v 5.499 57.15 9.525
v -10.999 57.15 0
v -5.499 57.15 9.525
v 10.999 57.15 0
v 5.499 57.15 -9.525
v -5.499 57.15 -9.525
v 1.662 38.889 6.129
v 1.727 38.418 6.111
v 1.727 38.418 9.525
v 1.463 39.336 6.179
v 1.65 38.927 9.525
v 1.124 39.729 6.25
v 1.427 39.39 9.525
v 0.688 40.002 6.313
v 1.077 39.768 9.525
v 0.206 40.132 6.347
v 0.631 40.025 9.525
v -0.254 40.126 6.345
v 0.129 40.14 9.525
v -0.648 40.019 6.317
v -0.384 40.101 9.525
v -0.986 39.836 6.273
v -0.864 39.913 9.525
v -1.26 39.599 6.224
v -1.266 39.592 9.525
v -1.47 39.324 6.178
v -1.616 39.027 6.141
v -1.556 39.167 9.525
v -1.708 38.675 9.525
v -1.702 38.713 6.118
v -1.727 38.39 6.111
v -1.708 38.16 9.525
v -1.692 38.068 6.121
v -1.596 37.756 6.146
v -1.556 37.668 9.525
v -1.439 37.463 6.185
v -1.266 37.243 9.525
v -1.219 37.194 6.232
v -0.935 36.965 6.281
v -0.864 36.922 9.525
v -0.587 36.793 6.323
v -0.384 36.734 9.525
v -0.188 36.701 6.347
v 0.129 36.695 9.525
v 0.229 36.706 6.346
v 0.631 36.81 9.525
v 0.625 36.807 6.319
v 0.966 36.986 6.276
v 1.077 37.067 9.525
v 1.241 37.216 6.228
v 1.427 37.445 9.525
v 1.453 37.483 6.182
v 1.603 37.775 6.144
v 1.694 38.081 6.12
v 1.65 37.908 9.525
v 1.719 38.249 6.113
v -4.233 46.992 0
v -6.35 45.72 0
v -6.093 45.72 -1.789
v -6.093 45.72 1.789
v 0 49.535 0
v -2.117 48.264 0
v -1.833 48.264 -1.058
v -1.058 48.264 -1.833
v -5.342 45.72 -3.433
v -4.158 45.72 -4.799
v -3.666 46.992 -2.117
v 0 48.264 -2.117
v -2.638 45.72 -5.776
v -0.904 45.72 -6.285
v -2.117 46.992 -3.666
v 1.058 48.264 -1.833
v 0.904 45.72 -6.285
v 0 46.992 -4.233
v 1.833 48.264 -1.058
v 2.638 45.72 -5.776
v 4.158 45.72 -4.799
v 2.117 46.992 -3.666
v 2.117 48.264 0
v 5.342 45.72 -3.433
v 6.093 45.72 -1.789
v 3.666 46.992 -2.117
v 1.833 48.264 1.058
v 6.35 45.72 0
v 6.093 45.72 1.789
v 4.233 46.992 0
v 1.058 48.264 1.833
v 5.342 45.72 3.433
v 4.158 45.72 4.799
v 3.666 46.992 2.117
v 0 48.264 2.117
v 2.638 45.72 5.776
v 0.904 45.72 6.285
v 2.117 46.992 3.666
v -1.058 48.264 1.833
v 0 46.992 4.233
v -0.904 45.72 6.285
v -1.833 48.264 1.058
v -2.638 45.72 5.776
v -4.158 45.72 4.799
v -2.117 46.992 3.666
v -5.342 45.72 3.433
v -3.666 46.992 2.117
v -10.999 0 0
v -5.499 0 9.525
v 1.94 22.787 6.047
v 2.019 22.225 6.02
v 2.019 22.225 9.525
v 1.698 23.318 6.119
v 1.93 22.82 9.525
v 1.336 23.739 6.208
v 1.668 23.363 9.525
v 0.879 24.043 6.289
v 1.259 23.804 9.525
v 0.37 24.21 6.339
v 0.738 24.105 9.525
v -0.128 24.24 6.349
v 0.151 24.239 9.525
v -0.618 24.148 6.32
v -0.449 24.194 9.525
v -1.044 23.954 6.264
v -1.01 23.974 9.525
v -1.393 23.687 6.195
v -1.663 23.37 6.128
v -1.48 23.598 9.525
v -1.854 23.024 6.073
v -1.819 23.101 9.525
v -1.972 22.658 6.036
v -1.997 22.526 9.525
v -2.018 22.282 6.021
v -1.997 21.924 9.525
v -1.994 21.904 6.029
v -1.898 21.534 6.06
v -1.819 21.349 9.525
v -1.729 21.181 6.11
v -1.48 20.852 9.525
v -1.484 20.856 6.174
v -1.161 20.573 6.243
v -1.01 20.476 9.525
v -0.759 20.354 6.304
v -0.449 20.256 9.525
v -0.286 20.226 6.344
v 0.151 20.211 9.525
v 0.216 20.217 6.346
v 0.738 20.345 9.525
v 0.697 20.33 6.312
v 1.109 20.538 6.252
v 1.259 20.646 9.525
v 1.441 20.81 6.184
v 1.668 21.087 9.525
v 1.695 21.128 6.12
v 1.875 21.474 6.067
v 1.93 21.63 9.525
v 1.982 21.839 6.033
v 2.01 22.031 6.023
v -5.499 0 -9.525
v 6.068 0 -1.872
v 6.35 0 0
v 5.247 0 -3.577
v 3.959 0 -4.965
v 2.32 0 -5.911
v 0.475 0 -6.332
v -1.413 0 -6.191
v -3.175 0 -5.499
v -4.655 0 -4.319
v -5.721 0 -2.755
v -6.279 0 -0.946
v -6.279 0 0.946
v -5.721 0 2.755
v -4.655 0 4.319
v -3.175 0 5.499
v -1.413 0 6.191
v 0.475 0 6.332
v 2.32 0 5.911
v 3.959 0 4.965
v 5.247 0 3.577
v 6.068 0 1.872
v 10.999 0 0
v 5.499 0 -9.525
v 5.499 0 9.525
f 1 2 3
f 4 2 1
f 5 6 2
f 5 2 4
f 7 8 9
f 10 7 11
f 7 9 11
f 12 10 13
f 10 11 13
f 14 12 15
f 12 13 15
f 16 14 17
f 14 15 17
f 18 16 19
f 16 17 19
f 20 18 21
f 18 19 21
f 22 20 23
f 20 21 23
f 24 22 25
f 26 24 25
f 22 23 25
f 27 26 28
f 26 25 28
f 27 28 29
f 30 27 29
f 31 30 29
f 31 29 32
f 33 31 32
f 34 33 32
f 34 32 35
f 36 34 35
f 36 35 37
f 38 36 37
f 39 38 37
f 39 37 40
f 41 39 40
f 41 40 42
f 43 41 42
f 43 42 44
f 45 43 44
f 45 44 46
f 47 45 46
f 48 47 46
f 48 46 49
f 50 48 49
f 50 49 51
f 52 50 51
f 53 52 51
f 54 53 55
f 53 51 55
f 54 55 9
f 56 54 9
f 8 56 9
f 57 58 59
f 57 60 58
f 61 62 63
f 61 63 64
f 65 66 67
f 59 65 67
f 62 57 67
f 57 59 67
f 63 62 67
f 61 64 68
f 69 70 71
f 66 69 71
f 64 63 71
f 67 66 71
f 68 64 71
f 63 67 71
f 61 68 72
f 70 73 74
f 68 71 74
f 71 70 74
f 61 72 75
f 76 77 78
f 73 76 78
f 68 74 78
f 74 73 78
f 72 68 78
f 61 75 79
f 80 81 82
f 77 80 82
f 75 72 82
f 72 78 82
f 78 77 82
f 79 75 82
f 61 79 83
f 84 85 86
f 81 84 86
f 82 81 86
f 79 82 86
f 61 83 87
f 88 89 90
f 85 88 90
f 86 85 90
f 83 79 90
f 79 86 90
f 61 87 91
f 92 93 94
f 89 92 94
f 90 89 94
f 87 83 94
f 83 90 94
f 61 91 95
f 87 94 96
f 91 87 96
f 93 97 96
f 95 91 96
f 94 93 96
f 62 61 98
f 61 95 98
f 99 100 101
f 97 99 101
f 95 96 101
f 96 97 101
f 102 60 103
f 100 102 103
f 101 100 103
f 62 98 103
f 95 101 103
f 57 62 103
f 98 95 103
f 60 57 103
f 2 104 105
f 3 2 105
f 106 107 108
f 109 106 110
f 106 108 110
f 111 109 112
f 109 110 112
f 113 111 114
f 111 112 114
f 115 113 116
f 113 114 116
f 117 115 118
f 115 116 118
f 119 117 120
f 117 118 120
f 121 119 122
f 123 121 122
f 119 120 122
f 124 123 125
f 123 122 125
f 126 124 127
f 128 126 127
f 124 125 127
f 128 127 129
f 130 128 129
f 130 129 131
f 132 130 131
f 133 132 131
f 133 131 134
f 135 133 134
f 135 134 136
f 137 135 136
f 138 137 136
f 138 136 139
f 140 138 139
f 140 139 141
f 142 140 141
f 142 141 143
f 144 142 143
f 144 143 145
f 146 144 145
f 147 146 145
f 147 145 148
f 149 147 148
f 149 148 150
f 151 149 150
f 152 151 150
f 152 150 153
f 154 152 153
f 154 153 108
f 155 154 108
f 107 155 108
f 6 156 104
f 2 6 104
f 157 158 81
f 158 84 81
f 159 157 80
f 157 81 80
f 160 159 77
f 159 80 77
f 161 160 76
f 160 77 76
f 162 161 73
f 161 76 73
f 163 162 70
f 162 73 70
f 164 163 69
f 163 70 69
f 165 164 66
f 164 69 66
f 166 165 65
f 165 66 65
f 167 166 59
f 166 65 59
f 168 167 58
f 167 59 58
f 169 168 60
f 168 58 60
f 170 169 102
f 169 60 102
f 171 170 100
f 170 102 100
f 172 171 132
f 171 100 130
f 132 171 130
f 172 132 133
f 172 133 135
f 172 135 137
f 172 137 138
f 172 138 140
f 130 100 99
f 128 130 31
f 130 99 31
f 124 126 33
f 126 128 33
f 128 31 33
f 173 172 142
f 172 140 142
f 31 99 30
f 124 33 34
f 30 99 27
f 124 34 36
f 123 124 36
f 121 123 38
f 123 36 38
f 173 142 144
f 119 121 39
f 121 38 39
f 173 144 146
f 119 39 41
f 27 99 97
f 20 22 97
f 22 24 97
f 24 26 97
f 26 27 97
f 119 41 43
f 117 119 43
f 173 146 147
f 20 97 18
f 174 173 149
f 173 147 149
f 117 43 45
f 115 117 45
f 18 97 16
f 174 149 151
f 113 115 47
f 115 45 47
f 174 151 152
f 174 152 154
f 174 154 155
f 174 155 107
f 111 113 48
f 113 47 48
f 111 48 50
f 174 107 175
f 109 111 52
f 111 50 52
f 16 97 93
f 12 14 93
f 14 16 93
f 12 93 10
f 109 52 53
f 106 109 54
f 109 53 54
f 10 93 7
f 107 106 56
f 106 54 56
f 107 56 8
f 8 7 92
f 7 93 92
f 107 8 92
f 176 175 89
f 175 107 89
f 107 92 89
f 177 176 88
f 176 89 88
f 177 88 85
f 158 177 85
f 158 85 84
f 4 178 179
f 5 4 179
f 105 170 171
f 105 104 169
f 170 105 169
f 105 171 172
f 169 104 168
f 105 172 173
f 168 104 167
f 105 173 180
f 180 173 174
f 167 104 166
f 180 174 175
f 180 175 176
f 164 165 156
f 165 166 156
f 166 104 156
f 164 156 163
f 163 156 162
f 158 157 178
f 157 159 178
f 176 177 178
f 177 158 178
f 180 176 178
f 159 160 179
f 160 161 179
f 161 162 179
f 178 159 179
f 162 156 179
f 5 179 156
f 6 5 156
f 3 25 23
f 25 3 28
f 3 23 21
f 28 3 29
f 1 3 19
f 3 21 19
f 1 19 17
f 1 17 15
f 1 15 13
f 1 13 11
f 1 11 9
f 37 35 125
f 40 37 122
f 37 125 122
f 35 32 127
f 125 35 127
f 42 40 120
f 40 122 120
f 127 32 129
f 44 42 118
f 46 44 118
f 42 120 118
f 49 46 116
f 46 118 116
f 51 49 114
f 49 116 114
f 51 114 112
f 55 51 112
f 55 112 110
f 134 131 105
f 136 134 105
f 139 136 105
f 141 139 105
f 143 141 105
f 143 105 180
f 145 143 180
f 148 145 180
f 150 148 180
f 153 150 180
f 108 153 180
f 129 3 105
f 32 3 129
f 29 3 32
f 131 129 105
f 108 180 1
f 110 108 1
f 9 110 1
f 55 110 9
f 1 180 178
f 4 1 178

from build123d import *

# Parameters (mm, degrees)
BOSS_EXTRUDE1_DEPTH              = 57.15
F_1_2_0_5_DIAMETER_HOLE1_D       = 12.7
F_1_2_0_5_DIAMETER_HOLE1_DEPTH   = 45.72
F_1_2_0_5_DIAMETER_HOLE1_TIP     = 3.815464931
F_10_32_TAPPED_HOLE1_REACH       = 63.237
F_10_32_TAPPED_HOLE1_BORE_R      = 2.0193
F_29_0_136_DIAMETER_HOLE1_REACH  = 63.237
F_29_0_136_DIAMETER_HOLE1_BORE_R = 1.7272


with BuildPart() as part:
    # Sketch1 → Boss-Extrude1 (new body)
    with BuildSketch(Plane(origin=(0, 0, 0), x_dir=(1, 0, 0), z_dir=(0, 1, 0))):
        Polygon((5.499261314, -9.525), (10.998522628, 0), (5.499261314, 9.525), (-5.499261314, 9.525), (-10.998522628, 0), (-5.499261314, -9.525), align=None)
    extrude(amount=BOSS_EXTRUDE1_DEPTH)

    # 1/2 (0.5) Diameter Hole1
    with Locations(Plane(origin=(0, 0, 0), x_dir=(-1, 0, 0), z_dir=(0, -1, 0))):
        with Locations((0, 0)):
            Hole(F_1_2_0_5_DIAMETER_HOLE1_D / 2, depth=F_1_2_0_5_DIAMETER_HOLE1_DEPTH)
            with Locations((0, 0, -(F_1_2_0_5_DIAMETER_HOLE1_DEPTH + F_1_2_0_5_DIAMETER_HOLE1_TIP / 2))):  # 118° drill point
                Cone(0, F_1_2_0_5_DIAMETER_HOLE1_D / 2, F_1_2_0_5_DIAMETER_HOLE1_TIP, mode=Mode.SUBTRACT)

    # #10-32 Tapped Hole1 bore → #10-32 Tapped Hole1 (cut, up to next)
    with BuildSketch(Plane.XY.offset(9.525), mode=Mode.PRIVATE) as f_10_32_tapped_hole1_sk1:
        with Locations((0, 22.225)):
            Circle(F_10_32_TAPPED_HOLE1_BORE_R)
    f_10_32_tapped_hole1_tool1 = extrude(f_10_32_tapped_hole1_sk1.sketch, amount=-F_10_32_TAPPED_HOLE1_REACH, mode=Mode.PRIVATE) & part.part
    add(f_10_32_tapped_hole1_tool1.solids().sort_by_distance((0, 22.225, 9.525))[0], mode=Mode.SUBTRACT)

    # #29 (0.136) Diameter Hole1 bore → #29 (0.136) Diameter Hole1 (cut, up to next)
    with BuildSketch(Plane.XY.offset(9.525), mode=Mode.PRIVATE) as f_29_0_136_diameter_hole1_sk1:
        with Locations((0, 38.4175)):
            Circle(F_29_0_136_DIAMETER_HOLE1_BORE_R)
    f_29_0_136_diameter_hole1_tool1 = extrude(f_29_0_136_diameter_hole1_sk1.sketch, amount=-F_29_0_136_DIAMETER_HOLE1_REACH, mode=Mode.PRIVATE) & part.part
    add(f_29_0_136_diameter_hole1_tool1.solids().sort_by_distance((0, 38.4175, 9.525))[0], mode=Mode.SUBTRACT)


solid = part.part
